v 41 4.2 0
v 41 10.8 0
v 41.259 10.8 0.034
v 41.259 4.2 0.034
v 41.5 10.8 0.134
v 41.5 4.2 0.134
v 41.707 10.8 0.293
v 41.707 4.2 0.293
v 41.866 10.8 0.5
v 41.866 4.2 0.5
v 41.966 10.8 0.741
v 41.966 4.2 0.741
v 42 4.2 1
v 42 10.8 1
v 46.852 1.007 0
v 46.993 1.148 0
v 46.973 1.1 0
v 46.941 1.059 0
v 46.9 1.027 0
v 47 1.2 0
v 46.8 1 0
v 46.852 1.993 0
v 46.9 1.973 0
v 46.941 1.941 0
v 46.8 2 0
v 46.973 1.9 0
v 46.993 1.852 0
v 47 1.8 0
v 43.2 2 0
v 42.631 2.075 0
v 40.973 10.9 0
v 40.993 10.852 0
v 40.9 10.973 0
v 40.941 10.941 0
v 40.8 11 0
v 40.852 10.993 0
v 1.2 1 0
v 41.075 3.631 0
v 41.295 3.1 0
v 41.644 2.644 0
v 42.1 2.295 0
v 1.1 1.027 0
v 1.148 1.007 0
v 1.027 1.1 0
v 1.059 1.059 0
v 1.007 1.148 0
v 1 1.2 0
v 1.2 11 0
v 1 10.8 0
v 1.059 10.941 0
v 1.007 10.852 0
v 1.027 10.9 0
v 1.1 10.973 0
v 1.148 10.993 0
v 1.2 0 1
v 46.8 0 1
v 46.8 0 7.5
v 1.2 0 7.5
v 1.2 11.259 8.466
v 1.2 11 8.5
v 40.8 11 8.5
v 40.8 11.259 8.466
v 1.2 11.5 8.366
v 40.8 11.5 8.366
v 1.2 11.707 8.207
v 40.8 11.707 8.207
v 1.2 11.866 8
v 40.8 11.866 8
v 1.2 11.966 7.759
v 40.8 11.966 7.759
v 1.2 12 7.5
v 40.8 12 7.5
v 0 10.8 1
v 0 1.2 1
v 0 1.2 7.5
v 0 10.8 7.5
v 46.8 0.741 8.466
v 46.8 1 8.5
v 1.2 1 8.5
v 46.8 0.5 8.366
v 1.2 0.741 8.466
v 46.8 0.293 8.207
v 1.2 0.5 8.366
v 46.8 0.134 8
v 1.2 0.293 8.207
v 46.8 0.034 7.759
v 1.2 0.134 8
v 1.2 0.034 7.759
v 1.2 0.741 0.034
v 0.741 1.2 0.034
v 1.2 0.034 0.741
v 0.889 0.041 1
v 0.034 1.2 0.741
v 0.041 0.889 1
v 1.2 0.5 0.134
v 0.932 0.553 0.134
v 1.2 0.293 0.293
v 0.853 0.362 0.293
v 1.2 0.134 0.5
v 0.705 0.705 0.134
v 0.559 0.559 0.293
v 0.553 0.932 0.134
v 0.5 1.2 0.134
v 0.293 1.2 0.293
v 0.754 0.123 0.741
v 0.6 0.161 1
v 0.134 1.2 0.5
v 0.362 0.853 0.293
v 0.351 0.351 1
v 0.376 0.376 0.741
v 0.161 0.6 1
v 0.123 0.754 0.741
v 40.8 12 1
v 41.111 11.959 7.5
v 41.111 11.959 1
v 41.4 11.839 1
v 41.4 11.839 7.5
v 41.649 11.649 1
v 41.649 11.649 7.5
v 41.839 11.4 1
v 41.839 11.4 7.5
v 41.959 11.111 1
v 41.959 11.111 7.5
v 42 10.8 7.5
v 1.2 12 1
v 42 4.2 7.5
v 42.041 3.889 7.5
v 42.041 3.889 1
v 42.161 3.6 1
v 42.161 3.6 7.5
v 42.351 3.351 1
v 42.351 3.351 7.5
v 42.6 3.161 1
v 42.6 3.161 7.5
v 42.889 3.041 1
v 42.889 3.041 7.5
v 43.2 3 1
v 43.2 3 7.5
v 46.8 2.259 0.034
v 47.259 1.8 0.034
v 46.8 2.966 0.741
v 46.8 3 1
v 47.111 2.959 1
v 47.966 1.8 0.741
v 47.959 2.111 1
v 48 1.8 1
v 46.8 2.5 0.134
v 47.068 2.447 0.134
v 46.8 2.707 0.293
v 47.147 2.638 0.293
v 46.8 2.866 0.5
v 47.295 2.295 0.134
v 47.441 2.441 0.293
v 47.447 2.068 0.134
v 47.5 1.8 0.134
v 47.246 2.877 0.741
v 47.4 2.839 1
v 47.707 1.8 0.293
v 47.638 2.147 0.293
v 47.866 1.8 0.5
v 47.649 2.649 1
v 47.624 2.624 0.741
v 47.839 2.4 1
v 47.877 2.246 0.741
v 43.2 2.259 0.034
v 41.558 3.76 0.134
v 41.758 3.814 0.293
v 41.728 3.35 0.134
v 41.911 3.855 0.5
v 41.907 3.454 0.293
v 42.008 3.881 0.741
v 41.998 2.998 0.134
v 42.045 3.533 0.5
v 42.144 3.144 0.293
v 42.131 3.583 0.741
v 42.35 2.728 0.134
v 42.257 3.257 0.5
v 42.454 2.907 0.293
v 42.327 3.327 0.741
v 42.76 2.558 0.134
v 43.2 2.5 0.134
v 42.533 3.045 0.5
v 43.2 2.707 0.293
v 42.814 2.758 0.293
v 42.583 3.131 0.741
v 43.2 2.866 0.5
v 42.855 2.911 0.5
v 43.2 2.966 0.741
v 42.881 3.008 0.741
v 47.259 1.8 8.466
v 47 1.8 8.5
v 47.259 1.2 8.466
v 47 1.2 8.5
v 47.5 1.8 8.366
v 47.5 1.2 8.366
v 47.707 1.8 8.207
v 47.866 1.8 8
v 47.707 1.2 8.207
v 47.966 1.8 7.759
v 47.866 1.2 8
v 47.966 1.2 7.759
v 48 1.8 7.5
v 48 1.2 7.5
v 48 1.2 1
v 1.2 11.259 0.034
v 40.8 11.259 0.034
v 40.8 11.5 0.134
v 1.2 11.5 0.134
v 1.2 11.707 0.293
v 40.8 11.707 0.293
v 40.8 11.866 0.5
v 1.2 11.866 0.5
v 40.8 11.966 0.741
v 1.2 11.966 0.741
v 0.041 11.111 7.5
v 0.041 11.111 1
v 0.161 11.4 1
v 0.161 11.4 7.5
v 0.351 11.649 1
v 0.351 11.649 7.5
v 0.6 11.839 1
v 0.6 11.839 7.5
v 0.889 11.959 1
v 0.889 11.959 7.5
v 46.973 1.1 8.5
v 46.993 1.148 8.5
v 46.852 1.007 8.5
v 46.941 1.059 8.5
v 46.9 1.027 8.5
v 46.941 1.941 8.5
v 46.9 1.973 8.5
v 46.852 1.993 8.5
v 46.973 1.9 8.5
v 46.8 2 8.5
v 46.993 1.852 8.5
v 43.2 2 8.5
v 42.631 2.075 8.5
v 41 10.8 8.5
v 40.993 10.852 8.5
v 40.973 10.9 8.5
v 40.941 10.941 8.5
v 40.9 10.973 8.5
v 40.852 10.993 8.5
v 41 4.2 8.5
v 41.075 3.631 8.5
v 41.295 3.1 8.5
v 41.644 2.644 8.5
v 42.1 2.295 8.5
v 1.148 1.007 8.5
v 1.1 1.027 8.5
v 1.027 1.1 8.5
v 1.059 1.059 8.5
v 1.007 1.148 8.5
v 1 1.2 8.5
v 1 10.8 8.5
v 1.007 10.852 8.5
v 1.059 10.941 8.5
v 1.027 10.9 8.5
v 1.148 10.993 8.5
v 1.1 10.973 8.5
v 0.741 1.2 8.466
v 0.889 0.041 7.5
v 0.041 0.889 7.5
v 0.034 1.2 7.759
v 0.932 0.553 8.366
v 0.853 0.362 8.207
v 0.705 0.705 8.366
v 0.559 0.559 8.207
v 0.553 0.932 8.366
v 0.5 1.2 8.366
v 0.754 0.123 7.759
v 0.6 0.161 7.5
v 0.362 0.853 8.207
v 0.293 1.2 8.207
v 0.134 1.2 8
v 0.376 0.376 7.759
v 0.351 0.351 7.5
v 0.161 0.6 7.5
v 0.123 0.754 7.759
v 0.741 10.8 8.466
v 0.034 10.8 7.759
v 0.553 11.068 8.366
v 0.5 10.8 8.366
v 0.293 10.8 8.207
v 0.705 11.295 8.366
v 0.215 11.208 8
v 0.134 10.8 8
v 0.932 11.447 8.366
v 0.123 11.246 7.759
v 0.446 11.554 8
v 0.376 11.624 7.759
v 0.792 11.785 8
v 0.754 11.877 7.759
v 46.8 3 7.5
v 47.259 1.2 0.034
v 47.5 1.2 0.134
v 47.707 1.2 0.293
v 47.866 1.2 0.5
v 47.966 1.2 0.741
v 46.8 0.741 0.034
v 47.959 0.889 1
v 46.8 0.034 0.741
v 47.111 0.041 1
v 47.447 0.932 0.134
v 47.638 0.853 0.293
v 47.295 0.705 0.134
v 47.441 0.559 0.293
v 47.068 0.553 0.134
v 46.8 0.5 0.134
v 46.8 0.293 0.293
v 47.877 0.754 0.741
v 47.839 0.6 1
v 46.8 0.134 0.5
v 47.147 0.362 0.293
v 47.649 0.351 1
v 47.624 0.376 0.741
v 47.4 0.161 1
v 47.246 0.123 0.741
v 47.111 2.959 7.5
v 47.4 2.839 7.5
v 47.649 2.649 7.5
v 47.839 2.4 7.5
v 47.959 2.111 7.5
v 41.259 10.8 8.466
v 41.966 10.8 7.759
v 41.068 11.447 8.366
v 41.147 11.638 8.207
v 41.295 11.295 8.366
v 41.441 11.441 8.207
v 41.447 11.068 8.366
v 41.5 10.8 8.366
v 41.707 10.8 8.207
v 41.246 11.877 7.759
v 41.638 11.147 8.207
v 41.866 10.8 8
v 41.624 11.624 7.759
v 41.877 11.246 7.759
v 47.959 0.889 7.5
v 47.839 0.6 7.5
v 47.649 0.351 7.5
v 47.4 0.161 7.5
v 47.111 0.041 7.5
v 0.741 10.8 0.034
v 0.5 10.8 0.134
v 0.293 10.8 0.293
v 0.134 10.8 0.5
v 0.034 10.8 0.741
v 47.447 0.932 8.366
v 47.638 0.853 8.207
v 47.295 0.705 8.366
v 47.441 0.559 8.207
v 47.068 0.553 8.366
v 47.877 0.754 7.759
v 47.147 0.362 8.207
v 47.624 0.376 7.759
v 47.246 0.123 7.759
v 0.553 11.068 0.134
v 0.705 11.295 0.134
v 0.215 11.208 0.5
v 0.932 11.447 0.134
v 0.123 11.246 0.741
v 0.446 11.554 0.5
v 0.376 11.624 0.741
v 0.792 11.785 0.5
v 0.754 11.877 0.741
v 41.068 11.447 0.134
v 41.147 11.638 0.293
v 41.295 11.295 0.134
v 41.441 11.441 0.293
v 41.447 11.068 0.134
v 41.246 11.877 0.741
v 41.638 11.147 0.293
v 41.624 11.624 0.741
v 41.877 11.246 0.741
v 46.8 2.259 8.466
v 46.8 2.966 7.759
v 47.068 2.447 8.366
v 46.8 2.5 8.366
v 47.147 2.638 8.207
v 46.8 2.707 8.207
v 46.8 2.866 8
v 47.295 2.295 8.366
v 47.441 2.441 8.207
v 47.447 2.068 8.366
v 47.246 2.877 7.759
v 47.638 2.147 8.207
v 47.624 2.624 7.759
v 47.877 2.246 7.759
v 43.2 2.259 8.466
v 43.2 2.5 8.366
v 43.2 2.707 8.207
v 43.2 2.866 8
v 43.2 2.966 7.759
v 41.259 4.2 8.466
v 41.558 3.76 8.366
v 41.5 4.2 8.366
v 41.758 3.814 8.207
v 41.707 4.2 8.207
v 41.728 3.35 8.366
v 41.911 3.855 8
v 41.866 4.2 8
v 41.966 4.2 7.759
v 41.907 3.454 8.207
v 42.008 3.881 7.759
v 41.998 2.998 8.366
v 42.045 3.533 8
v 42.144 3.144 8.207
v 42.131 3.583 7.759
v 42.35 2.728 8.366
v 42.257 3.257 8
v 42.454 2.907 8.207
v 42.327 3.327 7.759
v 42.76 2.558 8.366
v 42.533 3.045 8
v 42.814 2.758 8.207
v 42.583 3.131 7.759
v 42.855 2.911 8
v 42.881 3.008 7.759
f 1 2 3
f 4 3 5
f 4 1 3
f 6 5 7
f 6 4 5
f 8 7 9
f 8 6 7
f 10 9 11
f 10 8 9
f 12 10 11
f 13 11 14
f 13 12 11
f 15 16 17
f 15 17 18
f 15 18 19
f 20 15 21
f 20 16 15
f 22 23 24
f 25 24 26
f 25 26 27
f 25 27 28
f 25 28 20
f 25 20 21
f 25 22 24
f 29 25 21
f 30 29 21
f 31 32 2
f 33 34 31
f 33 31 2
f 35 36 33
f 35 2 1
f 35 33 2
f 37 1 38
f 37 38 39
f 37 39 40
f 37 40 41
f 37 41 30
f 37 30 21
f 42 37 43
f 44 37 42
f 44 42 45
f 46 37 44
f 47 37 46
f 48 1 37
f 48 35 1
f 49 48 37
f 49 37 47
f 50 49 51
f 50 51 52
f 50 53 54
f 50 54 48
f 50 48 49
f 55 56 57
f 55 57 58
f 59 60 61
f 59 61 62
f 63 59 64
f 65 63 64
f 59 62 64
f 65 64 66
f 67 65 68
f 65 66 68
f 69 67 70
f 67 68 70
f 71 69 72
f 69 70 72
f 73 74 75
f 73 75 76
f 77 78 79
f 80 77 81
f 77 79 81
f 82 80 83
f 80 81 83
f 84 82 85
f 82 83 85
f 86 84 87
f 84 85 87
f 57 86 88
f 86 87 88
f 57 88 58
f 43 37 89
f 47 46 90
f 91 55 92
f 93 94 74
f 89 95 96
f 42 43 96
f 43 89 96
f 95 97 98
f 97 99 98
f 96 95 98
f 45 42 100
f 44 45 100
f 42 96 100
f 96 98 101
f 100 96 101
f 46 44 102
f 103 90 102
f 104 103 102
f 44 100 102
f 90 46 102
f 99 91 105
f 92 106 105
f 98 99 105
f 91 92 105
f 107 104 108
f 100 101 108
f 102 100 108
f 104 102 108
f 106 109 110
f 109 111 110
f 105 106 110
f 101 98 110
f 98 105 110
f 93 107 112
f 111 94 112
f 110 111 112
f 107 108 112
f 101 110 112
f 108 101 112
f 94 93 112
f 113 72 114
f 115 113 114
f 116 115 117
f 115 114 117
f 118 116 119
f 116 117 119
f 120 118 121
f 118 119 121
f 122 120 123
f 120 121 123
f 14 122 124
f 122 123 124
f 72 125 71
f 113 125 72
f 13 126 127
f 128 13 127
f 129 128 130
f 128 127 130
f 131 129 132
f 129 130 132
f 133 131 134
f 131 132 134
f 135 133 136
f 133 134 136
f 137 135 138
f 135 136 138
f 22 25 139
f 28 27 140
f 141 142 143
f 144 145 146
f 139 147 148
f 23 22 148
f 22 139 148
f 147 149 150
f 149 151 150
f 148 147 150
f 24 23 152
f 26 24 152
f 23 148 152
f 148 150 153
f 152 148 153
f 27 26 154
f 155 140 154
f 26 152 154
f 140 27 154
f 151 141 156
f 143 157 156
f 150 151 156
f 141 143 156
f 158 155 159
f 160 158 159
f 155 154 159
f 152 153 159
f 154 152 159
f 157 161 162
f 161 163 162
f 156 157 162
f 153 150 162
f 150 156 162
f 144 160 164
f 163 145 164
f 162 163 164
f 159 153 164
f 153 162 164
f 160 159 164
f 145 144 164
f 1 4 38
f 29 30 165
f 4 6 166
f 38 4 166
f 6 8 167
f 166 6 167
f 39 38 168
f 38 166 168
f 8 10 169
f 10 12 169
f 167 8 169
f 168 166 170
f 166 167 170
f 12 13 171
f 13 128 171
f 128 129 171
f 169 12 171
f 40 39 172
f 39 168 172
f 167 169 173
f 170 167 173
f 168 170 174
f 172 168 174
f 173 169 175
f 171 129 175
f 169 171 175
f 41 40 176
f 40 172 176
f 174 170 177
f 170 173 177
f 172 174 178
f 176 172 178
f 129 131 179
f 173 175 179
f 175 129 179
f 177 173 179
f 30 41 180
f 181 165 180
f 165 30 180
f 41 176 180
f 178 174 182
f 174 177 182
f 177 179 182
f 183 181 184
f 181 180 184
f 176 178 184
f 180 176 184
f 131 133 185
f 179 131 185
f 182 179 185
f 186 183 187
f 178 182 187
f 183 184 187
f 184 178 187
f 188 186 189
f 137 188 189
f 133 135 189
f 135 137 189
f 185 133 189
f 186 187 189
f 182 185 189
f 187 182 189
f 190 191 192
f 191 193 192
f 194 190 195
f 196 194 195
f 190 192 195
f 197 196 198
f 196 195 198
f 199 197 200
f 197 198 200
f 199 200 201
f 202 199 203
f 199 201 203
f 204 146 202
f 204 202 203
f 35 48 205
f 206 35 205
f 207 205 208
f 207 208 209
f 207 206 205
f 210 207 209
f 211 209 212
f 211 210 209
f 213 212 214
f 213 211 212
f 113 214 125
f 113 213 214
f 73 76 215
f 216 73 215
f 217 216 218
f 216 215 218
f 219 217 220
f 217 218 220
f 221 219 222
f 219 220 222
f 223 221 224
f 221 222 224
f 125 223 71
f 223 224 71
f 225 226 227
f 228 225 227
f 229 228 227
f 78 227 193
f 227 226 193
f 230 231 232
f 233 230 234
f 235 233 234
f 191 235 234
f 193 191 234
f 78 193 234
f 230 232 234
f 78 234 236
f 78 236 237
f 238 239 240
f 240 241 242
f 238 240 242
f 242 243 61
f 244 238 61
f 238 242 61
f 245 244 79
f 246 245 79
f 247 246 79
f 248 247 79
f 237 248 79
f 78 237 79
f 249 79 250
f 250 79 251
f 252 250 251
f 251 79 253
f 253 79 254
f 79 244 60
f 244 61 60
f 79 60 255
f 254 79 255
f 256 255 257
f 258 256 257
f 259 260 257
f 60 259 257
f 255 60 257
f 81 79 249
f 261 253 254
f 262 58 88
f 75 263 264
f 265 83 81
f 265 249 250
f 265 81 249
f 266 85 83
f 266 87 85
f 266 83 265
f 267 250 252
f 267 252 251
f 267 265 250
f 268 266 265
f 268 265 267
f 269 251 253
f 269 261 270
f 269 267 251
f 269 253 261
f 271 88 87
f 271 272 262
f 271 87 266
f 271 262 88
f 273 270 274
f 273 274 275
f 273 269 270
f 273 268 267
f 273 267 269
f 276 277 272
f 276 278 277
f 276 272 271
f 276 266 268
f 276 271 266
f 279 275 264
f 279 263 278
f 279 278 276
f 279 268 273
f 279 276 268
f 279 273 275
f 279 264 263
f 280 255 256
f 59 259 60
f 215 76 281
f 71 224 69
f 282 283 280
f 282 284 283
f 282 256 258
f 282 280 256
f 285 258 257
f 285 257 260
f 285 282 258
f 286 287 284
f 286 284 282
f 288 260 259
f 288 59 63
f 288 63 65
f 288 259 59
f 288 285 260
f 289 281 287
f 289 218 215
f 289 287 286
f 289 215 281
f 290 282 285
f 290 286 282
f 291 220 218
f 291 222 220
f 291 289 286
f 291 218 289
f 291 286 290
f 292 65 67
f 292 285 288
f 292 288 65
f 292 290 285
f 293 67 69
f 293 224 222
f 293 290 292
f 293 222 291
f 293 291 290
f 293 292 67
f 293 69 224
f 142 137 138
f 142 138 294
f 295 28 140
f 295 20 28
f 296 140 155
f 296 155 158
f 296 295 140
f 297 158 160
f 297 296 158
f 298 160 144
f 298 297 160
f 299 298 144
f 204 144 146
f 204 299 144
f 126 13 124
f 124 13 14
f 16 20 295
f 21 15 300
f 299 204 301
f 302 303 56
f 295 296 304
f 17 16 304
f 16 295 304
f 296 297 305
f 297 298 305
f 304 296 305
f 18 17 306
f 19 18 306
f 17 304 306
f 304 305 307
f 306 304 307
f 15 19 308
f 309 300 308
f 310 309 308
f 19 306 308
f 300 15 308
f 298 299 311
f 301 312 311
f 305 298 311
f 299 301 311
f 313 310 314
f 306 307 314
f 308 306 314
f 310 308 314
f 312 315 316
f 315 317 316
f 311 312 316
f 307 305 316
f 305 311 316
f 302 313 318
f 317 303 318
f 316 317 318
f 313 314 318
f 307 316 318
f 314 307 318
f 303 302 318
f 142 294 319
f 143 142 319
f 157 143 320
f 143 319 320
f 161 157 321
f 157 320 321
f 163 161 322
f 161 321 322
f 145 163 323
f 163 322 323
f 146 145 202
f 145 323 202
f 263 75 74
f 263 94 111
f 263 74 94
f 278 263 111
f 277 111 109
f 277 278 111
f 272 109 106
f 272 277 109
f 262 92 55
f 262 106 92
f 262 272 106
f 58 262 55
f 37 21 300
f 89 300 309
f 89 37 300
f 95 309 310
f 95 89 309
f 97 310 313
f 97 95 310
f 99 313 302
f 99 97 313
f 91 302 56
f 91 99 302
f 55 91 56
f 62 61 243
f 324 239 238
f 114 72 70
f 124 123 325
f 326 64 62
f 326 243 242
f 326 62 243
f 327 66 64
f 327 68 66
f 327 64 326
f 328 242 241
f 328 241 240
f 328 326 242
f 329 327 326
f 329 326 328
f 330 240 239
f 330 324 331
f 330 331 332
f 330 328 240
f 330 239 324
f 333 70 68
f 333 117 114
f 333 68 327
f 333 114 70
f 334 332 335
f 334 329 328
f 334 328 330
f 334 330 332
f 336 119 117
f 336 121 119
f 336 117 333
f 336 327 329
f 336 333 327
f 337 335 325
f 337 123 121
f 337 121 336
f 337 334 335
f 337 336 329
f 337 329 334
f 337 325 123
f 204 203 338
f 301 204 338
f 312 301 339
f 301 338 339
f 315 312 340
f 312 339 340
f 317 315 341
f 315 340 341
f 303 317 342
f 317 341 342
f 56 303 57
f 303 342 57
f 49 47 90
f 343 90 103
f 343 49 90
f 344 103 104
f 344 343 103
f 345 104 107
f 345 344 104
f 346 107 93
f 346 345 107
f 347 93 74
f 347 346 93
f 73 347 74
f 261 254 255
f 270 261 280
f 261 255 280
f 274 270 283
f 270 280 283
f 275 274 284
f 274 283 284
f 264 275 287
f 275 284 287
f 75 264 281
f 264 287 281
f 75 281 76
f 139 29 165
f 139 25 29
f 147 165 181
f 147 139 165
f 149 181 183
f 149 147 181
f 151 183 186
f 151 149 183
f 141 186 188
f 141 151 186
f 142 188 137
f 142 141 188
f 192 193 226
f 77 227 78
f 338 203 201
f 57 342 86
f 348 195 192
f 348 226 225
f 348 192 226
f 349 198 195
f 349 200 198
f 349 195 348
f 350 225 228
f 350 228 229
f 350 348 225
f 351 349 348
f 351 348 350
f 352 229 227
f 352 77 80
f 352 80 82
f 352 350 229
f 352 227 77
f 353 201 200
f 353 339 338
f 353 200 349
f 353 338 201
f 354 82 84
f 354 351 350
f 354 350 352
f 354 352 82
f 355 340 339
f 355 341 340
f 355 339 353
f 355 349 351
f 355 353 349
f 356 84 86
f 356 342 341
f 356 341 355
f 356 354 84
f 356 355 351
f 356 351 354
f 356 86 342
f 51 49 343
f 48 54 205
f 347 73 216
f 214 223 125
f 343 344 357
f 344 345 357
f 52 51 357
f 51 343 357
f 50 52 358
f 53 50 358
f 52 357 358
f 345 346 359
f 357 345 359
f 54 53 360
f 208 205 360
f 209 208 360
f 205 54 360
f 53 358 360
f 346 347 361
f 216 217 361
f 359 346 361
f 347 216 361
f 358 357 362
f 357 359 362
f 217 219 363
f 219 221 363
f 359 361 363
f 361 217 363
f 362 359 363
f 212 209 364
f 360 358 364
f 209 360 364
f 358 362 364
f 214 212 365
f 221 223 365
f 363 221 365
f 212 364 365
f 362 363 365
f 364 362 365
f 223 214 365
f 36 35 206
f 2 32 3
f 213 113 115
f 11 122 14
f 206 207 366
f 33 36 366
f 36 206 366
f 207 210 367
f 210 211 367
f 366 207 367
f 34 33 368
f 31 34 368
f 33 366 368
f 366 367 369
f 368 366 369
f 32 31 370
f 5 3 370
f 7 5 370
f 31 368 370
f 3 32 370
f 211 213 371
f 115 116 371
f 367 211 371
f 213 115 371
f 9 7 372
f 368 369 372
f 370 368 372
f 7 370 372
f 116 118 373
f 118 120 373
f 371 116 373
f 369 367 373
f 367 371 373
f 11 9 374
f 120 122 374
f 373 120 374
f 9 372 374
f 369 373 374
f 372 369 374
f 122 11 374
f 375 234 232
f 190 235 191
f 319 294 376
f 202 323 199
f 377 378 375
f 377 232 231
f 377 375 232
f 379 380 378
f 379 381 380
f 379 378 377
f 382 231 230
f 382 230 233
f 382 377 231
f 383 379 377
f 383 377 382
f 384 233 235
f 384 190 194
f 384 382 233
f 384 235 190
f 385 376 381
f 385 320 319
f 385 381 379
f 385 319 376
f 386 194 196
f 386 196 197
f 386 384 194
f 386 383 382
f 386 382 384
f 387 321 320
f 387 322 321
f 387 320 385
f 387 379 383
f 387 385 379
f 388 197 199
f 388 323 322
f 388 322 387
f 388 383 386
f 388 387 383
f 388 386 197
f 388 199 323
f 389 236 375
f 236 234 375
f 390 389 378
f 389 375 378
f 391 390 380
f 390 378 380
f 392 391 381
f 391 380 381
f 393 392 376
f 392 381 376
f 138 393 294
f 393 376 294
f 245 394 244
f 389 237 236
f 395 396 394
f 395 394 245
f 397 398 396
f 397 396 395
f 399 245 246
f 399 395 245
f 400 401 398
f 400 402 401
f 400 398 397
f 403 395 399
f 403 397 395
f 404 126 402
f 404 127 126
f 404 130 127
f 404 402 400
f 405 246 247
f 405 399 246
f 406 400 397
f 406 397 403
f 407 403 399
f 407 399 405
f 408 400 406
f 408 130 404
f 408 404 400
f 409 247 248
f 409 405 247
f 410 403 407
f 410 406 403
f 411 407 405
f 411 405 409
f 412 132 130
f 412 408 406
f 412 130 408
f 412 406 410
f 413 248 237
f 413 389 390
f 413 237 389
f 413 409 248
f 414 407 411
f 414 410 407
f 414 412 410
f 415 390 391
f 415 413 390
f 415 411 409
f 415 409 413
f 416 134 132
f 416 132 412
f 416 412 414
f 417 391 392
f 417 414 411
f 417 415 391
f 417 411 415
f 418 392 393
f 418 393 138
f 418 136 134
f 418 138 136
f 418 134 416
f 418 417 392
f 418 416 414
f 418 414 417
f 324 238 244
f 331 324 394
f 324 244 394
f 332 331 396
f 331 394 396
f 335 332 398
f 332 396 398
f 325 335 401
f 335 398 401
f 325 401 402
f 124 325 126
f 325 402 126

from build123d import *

# Parameters (mm, degrees)
PAD_DEPTH   = 8.5
FILLET_R    = 1.2
FILLET001_R = 1


with BuildPart() as part:
    # Sketch → Pad (new body)
    with BuildSketch(Plane.XY):
        Polygon((0, 0), (0, 12), (42, 12), (42, 9), (42, 9), (42, 3), (48, 3), (48, 0), align=None)
    extrude(amount=PAD_DEPTH)

    # Fillet
    fillet_edges = [part.edges().sort_by_distance(p)[0] for p in [
        (48, 0, 4.25),
        (48, 3, 4.25),
        (42, 3, 4.25),
        (42, 12, 4.25),
        (0, 12, 4.25),
        (0, 0, 4.25),
    ]]
    fillet(fillet_edges, radius=FILLET_R)

    # Fillet001
    fillet001_edges = [part.edges().sort_by_distance(p)[0] for p in [
        (21, 12, 8.5),
        (21, 12, 0),
    ]]
    fillet(fillet001_edges, radius=FILLET001_R)


solid = part.part
